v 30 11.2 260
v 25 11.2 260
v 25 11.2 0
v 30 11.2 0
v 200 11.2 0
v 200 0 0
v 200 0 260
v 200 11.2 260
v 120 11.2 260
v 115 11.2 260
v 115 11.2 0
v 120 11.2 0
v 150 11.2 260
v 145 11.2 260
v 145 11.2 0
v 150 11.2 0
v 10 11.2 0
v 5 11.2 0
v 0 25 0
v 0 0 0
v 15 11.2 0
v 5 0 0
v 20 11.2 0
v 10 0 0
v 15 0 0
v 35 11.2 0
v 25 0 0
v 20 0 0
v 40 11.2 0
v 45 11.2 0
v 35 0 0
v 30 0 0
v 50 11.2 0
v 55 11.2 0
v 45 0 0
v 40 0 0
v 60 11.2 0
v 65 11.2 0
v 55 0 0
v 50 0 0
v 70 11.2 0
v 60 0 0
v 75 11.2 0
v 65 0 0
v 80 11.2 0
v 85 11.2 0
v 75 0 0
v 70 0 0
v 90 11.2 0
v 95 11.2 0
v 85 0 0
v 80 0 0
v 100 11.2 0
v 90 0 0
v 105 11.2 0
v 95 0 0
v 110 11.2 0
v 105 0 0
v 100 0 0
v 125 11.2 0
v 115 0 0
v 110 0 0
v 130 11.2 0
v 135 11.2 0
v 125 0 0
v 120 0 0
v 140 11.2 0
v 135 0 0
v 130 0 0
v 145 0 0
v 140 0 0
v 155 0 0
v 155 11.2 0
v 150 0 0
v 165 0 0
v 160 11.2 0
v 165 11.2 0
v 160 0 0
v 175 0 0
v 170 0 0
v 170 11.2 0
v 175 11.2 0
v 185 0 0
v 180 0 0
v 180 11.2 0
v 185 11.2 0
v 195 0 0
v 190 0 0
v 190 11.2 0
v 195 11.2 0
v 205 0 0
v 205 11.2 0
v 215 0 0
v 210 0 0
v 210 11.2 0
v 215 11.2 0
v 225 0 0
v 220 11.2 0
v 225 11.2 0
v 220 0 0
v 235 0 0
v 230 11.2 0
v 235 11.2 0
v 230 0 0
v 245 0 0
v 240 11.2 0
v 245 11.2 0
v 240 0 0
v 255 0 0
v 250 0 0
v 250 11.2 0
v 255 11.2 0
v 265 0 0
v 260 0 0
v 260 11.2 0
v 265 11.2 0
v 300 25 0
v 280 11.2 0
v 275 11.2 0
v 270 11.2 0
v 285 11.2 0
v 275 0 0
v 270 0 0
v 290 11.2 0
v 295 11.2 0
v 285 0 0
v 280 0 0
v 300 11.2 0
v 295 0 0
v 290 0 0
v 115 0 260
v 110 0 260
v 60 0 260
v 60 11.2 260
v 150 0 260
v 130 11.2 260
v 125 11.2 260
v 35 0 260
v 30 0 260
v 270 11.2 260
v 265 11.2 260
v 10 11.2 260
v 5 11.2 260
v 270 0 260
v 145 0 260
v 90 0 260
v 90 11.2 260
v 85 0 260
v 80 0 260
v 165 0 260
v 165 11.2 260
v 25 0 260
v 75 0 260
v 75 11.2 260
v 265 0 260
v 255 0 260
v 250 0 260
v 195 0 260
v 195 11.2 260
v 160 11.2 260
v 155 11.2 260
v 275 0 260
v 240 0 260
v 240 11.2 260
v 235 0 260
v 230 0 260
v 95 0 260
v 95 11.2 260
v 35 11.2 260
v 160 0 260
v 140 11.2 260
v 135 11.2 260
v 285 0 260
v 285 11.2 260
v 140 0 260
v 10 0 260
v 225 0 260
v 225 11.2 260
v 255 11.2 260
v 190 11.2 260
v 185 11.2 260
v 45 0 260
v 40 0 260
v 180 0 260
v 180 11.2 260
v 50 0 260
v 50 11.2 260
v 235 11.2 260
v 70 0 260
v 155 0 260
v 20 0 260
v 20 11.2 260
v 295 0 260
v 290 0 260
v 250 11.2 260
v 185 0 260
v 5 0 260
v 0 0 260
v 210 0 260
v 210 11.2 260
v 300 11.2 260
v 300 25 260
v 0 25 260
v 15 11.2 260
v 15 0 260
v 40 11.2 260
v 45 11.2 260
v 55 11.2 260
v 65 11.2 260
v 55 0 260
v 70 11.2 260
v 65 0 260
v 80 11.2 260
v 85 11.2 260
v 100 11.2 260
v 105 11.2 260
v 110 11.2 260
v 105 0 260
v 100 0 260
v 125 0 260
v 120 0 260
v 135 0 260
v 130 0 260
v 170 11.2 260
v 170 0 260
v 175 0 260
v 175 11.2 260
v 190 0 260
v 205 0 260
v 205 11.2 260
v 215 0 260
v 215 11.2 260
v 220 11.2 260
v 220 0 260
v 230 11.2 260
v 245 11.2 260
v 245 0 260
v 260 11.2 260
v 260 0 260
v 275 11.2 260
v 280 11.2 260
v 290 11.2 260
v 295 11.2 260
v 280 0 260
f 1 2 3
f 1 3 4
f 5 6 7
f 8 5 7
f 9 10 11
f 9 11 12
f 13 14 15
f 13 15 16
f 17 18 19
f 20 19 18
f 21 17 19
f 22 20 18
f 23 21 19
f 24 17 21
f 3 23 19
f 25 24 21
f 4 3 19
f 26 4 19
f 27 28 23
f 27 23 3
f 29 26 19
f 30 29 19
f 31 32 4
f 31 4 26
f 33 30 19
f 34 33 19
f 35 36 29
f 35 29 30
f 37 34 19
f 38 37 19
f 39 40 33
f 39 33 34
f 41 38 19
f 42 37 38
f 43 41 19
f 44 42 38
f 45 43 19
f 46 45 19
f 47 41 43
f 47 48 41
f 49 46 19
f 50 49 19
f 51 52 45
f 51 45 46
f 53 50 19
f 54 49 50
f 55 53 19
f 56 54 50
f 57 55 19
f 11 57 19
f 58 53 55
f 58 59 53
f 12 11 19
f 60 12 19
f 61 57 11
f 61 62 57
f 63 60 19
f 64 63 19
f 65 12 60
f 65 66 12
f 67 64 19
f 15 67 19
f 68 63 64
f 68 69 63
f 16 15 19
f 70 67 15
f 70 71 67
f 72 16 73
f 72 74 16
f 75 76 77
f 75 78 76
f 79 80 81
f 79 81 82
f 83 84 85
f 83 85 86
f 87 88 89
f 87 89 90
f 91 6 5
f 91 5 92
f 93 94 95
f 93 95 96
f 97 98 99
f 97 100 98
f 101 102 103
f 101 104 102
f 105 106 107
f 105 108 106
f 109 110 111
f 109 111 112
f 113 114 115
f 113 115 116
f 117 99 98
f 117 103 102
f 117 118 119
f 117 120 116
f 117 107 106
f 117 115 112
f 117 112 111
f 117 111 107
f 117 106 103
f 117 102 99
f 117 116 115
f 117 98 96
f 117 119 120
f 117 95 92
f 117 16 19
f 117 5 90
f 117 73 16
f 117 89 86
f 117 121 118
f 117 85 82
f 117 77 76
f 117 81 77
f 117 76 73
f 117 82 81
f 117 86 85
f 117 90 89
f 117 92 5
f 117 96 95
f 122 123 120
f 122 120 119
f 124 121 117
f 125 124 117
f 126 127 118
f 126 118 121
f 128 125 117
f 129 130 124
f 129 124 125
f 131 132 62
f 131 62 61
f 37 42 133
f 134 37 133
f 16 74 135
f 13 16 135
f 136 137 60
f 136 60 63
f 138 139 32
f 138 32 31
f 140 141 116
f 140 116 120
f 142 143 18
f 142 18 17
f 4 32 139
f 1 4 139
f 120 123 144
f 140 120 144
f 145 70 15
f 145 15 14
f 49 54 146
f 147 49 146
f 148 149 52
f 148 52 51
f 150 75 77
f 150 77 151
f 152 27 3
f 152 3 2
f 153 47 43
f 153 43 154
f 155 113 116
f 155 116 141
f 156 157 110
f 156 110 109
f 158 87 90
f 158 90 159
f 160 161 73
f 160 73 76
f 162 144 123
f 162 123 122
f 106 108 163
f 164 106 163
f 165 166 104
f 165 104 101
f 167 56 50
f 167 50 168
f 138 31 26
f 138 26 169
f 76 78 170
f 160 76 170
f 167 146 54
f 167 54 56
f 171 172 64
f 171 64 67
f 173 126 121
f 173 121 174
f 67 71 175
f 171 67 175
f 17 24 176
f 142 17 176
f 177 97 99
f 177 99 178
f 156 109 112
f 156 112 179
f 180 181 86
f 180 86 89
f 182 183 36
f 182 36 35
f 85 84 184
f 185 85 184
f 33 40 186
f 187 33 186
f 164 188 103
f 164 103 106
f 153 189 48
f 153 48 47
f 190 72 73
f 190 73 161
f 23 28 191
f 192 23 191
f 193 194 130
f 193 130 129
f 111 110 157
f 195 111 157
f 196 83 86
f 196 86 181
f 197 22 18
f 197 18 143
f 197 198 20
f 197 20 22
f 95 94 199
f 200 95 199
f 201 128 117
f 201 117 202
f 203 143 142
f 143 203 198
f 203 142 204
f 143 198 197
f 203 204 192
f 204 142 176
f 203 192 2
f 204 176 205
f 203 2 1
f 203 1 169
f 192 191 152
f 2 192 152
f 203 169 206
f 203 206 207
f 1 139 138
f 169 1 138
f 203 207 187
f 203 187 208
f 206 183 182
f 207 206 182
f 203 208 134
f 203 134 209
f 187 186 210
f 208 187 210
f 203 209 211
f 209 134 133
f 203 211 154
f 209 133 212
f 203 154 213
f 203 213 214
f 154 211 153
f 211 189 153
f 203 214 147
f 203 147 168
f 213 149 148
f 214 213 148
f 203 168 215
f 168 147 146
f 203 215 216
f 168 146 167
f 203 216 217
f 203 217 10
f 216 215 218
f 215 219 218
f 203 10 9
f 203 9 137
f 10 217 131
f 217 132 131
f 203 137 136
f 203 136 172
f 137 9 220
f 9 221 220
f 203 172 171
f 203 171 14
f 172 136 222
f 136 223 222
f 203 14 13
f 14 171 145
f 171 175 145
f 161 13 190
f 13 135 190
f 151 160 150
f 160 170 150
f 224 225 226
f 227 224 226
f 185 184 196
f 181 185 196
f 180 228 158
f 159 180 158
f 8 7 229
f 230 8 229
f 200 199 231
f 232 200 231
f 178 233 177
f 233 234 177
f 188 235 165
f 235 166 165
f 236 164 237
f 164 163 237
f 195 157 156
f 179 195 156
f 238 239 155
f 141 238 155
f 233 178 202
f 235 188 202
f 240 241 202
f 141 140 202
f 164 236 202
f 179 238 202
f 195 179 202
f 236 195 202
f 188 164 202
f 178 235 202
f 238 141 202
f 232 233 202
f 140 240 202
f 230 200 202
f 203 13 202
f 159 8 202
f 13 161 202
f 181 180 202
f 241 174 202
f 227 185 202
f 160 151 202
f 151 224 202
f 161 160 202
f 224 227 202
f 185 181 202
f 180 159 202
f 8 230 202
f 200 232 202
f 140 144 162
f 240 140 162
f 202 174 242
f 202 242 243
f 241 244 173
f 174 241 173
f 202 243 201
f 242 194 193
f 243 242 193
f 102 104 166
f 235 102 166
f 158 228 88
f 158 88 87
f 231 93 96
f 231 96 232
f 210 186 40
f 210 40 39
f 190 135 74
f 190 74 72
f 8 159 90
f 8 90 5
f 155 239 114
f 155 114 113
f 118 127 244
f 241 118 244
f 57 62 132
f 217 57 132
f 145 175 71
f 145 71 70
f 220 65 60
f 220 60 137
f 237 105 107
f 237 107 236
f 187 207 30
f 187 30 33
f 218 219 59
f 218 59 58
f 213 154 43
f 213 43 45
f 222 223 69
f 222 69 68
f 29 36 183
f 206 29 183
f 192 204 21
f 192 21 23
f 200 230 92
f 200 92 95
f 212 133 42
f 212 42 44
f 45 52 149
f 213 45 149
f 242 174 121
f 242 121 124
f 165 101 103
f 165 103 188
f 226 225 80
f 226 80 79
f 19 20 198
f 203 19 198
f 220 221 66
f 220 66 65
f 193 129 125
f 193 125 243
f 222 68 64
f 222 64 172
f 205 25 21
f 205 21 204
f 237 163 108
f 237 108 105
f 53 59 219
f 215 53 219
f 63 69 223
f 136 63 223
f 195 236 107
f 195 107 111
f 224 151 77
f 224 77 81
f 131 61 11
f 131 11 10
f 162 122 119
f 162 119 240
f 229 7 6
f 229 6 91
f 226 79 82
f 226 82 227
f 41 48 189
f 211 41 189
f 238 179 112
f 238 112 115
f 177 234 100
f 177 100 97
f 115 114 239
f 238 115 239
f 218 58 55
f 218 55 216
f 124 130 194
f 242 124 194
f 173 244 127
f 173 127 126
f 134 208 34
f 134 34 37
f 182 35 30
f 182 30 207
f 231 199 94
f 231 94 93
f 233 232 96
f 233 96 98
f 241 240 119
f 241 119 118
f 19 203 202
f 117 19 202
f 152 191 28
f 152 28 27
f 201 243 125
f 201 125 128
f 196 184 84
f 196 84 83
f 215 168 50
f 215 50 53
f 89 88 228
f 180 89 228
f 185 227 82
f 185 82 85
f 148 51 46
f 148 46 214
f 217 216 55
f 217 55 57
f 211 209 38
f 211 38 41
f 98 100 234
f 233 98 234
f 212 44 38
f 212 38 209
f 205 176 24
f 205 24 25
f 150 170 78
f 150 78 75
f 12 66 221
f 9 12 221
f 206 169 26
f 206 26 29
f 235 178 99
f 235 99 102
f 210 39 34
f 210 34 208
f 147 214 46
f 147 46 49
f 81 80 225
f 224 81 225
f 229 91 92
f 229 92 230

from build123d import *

# Parameters (mm, degrees)
F0_W     = 300
F0_H     = 260
F1_DEPTH = 25
F2_W     = 5
F2_H     = 260
F3_DEPTH = 11.2


with BuildPart() as f1:
    # F0 (on Front) → F1 (new body)
    with BuildSketch(Plane.XZ):
        with Locations((150, 130)):
            Rectangle(F0_W, F0_H)
    extrude(amount=-F1_DEPTH)

    # F2 (on face) → F3 (cut)
    with BuildSketch(Plane.XZ):
        with Locations((7.5, 130)):
            Rectangle(F2_W, F2_H)
        with Locations((17.5, 130)):
            Rectangle(F2_W, F2_H)
        with Locations((27.5, 130)):
            Rectangle(F2_W, F2_H)
        with Locations((37.5, 130)):
            Rectangle(F2_W, F2_H)
        with Locations((47.5, 130)):
            Rectangle(F2_W, F2_H)
        with Locations((57.5, 130)):
            Rectangle(F2_W, F2_H)
        with Locations((67.5, 130)):
            Rectangle(F2_W, F2_H)
        with Locations((77.5, 130)):
            Rectangle(F2_W, F2_H)
        with Locations((87.5, 130)):
            Rectangle(F2_W, F2_H)
        with Locations((97.5, 130)):
            Rectangle(F2_W, F2_H)
        with Locations((107.5, 130)):
            Rectangle(F2_W, F2_H)
        with Locations((117.5, 130)):
            Rectangle(F2_W, F2_H)
        with Locations((127.5, 130)):
            Rectangle(F2_W, F2_H)
        with Locations((137.5, 130)):
            Rectangle(F2_W, F2_H)
        with Locations((147.5, 130)):
            Rectangle(F2_W, F2_H)
        with Locations((157.5, 130)):
            Rectangle(F2_W, F2_H)
        with Locations((167.5, 130)):
            Rectangle(F2_W, F2_H)
        with Locations((177.5, 130)):
            Rectangle(F2_W, F2_H)
        with Locations((187.5, 130)):
            Rectangle(F2_W, F2_H)
        with Locations((197.5, 130)):
            Rectangle(F2_W, F2_H)
        with Locations((207.5, 130)):
            Rectangle(F2_W, F2_H)
        with Locations((217.5, 130)):
            Rectangle(F2_W, F2_H)
        with Locations((227.5, 130)):
            Rectangle(F2_W, F2_H)
        with Locations((237.5, 130)):
            Rectangle(F2_W, F2_H)
        with Locations((247.5, 130)):
            Rectangle(F2_W, F2_H)
        with Locations((257.5, 130)):
            Rectangle(F2_W, F2_H)
        with Locations((267.5, 130)):
            Rectangle(F2_W, F2_H)
        with Locations((277.5, 130)):
            Rectangle(F2_W, F2_H)
        with Locations((287.5, 130)):
            Rectangle(F2_W, F2_H)
        with Locations((297.5, 130)):
            Rectangle(F2_W, F2_H)
        with Locations((307.5, 130)):
            Rectangle(F2_W, F2_H)
        with Locations((317.5, 130)):
            Rectangle(F2_W, F2_H)
        with Locations((327.5, 130)):
            Rectangle(F2_W, F2_H)
        with Locations((337.5, 130)):
            Rectangle(F2_W, F2_H)
        with Locations((347.5, 130)):
            Rectangle(F2_W, F2_H)
        with Locations((357.5, 130)):
            Rectangle(F2_W, F2_H)
        with Locations((367.5, 130)):
            Rectangle(F2_W, F2_H)
        with Locations((377.5, 130)):
            Rectangle(F2_W, F2_H)
        with Locations((387.5, 130)):
            Rectangle(F2_W, F2_H)
        with Locations((397.5, 130)):
            Rectangle(F2_W, F2_H)
        with Locations((407.5, 130)):
            Rectangle(F2_W, F2_H)
        with Locations((417.5, 130)):
            Rectangle(F2_W, F2_H)
        with Locations((427.5, 130)):
            Rectangle(F2_W, F2_H)
        with Locations((437.5, 130)):
            Rectangle(F2_W, F2_H)
        with Locations((447.5, 130)):
            Rectangle(F2_W, F2_H)
        with Locations((457.5, 130)):
            Rectangle(F2_W, F2_H)
        with Locations((467.5, 130)):
            Rectangle(F2_W, F2_H)
        with Locations((477.5, 130)):
            Rectangle(F2_W, F2_H)
        with Locations((487.5, 130)):
            Rectangle(F2_W, F2_H)
        with Locations((497.5, 130)):
            Rectangle(F2_W, F2_H)
    extrude(amount=-F3_DEPTH, mode=Mode.SUBTRACT)


solid = f1.part
